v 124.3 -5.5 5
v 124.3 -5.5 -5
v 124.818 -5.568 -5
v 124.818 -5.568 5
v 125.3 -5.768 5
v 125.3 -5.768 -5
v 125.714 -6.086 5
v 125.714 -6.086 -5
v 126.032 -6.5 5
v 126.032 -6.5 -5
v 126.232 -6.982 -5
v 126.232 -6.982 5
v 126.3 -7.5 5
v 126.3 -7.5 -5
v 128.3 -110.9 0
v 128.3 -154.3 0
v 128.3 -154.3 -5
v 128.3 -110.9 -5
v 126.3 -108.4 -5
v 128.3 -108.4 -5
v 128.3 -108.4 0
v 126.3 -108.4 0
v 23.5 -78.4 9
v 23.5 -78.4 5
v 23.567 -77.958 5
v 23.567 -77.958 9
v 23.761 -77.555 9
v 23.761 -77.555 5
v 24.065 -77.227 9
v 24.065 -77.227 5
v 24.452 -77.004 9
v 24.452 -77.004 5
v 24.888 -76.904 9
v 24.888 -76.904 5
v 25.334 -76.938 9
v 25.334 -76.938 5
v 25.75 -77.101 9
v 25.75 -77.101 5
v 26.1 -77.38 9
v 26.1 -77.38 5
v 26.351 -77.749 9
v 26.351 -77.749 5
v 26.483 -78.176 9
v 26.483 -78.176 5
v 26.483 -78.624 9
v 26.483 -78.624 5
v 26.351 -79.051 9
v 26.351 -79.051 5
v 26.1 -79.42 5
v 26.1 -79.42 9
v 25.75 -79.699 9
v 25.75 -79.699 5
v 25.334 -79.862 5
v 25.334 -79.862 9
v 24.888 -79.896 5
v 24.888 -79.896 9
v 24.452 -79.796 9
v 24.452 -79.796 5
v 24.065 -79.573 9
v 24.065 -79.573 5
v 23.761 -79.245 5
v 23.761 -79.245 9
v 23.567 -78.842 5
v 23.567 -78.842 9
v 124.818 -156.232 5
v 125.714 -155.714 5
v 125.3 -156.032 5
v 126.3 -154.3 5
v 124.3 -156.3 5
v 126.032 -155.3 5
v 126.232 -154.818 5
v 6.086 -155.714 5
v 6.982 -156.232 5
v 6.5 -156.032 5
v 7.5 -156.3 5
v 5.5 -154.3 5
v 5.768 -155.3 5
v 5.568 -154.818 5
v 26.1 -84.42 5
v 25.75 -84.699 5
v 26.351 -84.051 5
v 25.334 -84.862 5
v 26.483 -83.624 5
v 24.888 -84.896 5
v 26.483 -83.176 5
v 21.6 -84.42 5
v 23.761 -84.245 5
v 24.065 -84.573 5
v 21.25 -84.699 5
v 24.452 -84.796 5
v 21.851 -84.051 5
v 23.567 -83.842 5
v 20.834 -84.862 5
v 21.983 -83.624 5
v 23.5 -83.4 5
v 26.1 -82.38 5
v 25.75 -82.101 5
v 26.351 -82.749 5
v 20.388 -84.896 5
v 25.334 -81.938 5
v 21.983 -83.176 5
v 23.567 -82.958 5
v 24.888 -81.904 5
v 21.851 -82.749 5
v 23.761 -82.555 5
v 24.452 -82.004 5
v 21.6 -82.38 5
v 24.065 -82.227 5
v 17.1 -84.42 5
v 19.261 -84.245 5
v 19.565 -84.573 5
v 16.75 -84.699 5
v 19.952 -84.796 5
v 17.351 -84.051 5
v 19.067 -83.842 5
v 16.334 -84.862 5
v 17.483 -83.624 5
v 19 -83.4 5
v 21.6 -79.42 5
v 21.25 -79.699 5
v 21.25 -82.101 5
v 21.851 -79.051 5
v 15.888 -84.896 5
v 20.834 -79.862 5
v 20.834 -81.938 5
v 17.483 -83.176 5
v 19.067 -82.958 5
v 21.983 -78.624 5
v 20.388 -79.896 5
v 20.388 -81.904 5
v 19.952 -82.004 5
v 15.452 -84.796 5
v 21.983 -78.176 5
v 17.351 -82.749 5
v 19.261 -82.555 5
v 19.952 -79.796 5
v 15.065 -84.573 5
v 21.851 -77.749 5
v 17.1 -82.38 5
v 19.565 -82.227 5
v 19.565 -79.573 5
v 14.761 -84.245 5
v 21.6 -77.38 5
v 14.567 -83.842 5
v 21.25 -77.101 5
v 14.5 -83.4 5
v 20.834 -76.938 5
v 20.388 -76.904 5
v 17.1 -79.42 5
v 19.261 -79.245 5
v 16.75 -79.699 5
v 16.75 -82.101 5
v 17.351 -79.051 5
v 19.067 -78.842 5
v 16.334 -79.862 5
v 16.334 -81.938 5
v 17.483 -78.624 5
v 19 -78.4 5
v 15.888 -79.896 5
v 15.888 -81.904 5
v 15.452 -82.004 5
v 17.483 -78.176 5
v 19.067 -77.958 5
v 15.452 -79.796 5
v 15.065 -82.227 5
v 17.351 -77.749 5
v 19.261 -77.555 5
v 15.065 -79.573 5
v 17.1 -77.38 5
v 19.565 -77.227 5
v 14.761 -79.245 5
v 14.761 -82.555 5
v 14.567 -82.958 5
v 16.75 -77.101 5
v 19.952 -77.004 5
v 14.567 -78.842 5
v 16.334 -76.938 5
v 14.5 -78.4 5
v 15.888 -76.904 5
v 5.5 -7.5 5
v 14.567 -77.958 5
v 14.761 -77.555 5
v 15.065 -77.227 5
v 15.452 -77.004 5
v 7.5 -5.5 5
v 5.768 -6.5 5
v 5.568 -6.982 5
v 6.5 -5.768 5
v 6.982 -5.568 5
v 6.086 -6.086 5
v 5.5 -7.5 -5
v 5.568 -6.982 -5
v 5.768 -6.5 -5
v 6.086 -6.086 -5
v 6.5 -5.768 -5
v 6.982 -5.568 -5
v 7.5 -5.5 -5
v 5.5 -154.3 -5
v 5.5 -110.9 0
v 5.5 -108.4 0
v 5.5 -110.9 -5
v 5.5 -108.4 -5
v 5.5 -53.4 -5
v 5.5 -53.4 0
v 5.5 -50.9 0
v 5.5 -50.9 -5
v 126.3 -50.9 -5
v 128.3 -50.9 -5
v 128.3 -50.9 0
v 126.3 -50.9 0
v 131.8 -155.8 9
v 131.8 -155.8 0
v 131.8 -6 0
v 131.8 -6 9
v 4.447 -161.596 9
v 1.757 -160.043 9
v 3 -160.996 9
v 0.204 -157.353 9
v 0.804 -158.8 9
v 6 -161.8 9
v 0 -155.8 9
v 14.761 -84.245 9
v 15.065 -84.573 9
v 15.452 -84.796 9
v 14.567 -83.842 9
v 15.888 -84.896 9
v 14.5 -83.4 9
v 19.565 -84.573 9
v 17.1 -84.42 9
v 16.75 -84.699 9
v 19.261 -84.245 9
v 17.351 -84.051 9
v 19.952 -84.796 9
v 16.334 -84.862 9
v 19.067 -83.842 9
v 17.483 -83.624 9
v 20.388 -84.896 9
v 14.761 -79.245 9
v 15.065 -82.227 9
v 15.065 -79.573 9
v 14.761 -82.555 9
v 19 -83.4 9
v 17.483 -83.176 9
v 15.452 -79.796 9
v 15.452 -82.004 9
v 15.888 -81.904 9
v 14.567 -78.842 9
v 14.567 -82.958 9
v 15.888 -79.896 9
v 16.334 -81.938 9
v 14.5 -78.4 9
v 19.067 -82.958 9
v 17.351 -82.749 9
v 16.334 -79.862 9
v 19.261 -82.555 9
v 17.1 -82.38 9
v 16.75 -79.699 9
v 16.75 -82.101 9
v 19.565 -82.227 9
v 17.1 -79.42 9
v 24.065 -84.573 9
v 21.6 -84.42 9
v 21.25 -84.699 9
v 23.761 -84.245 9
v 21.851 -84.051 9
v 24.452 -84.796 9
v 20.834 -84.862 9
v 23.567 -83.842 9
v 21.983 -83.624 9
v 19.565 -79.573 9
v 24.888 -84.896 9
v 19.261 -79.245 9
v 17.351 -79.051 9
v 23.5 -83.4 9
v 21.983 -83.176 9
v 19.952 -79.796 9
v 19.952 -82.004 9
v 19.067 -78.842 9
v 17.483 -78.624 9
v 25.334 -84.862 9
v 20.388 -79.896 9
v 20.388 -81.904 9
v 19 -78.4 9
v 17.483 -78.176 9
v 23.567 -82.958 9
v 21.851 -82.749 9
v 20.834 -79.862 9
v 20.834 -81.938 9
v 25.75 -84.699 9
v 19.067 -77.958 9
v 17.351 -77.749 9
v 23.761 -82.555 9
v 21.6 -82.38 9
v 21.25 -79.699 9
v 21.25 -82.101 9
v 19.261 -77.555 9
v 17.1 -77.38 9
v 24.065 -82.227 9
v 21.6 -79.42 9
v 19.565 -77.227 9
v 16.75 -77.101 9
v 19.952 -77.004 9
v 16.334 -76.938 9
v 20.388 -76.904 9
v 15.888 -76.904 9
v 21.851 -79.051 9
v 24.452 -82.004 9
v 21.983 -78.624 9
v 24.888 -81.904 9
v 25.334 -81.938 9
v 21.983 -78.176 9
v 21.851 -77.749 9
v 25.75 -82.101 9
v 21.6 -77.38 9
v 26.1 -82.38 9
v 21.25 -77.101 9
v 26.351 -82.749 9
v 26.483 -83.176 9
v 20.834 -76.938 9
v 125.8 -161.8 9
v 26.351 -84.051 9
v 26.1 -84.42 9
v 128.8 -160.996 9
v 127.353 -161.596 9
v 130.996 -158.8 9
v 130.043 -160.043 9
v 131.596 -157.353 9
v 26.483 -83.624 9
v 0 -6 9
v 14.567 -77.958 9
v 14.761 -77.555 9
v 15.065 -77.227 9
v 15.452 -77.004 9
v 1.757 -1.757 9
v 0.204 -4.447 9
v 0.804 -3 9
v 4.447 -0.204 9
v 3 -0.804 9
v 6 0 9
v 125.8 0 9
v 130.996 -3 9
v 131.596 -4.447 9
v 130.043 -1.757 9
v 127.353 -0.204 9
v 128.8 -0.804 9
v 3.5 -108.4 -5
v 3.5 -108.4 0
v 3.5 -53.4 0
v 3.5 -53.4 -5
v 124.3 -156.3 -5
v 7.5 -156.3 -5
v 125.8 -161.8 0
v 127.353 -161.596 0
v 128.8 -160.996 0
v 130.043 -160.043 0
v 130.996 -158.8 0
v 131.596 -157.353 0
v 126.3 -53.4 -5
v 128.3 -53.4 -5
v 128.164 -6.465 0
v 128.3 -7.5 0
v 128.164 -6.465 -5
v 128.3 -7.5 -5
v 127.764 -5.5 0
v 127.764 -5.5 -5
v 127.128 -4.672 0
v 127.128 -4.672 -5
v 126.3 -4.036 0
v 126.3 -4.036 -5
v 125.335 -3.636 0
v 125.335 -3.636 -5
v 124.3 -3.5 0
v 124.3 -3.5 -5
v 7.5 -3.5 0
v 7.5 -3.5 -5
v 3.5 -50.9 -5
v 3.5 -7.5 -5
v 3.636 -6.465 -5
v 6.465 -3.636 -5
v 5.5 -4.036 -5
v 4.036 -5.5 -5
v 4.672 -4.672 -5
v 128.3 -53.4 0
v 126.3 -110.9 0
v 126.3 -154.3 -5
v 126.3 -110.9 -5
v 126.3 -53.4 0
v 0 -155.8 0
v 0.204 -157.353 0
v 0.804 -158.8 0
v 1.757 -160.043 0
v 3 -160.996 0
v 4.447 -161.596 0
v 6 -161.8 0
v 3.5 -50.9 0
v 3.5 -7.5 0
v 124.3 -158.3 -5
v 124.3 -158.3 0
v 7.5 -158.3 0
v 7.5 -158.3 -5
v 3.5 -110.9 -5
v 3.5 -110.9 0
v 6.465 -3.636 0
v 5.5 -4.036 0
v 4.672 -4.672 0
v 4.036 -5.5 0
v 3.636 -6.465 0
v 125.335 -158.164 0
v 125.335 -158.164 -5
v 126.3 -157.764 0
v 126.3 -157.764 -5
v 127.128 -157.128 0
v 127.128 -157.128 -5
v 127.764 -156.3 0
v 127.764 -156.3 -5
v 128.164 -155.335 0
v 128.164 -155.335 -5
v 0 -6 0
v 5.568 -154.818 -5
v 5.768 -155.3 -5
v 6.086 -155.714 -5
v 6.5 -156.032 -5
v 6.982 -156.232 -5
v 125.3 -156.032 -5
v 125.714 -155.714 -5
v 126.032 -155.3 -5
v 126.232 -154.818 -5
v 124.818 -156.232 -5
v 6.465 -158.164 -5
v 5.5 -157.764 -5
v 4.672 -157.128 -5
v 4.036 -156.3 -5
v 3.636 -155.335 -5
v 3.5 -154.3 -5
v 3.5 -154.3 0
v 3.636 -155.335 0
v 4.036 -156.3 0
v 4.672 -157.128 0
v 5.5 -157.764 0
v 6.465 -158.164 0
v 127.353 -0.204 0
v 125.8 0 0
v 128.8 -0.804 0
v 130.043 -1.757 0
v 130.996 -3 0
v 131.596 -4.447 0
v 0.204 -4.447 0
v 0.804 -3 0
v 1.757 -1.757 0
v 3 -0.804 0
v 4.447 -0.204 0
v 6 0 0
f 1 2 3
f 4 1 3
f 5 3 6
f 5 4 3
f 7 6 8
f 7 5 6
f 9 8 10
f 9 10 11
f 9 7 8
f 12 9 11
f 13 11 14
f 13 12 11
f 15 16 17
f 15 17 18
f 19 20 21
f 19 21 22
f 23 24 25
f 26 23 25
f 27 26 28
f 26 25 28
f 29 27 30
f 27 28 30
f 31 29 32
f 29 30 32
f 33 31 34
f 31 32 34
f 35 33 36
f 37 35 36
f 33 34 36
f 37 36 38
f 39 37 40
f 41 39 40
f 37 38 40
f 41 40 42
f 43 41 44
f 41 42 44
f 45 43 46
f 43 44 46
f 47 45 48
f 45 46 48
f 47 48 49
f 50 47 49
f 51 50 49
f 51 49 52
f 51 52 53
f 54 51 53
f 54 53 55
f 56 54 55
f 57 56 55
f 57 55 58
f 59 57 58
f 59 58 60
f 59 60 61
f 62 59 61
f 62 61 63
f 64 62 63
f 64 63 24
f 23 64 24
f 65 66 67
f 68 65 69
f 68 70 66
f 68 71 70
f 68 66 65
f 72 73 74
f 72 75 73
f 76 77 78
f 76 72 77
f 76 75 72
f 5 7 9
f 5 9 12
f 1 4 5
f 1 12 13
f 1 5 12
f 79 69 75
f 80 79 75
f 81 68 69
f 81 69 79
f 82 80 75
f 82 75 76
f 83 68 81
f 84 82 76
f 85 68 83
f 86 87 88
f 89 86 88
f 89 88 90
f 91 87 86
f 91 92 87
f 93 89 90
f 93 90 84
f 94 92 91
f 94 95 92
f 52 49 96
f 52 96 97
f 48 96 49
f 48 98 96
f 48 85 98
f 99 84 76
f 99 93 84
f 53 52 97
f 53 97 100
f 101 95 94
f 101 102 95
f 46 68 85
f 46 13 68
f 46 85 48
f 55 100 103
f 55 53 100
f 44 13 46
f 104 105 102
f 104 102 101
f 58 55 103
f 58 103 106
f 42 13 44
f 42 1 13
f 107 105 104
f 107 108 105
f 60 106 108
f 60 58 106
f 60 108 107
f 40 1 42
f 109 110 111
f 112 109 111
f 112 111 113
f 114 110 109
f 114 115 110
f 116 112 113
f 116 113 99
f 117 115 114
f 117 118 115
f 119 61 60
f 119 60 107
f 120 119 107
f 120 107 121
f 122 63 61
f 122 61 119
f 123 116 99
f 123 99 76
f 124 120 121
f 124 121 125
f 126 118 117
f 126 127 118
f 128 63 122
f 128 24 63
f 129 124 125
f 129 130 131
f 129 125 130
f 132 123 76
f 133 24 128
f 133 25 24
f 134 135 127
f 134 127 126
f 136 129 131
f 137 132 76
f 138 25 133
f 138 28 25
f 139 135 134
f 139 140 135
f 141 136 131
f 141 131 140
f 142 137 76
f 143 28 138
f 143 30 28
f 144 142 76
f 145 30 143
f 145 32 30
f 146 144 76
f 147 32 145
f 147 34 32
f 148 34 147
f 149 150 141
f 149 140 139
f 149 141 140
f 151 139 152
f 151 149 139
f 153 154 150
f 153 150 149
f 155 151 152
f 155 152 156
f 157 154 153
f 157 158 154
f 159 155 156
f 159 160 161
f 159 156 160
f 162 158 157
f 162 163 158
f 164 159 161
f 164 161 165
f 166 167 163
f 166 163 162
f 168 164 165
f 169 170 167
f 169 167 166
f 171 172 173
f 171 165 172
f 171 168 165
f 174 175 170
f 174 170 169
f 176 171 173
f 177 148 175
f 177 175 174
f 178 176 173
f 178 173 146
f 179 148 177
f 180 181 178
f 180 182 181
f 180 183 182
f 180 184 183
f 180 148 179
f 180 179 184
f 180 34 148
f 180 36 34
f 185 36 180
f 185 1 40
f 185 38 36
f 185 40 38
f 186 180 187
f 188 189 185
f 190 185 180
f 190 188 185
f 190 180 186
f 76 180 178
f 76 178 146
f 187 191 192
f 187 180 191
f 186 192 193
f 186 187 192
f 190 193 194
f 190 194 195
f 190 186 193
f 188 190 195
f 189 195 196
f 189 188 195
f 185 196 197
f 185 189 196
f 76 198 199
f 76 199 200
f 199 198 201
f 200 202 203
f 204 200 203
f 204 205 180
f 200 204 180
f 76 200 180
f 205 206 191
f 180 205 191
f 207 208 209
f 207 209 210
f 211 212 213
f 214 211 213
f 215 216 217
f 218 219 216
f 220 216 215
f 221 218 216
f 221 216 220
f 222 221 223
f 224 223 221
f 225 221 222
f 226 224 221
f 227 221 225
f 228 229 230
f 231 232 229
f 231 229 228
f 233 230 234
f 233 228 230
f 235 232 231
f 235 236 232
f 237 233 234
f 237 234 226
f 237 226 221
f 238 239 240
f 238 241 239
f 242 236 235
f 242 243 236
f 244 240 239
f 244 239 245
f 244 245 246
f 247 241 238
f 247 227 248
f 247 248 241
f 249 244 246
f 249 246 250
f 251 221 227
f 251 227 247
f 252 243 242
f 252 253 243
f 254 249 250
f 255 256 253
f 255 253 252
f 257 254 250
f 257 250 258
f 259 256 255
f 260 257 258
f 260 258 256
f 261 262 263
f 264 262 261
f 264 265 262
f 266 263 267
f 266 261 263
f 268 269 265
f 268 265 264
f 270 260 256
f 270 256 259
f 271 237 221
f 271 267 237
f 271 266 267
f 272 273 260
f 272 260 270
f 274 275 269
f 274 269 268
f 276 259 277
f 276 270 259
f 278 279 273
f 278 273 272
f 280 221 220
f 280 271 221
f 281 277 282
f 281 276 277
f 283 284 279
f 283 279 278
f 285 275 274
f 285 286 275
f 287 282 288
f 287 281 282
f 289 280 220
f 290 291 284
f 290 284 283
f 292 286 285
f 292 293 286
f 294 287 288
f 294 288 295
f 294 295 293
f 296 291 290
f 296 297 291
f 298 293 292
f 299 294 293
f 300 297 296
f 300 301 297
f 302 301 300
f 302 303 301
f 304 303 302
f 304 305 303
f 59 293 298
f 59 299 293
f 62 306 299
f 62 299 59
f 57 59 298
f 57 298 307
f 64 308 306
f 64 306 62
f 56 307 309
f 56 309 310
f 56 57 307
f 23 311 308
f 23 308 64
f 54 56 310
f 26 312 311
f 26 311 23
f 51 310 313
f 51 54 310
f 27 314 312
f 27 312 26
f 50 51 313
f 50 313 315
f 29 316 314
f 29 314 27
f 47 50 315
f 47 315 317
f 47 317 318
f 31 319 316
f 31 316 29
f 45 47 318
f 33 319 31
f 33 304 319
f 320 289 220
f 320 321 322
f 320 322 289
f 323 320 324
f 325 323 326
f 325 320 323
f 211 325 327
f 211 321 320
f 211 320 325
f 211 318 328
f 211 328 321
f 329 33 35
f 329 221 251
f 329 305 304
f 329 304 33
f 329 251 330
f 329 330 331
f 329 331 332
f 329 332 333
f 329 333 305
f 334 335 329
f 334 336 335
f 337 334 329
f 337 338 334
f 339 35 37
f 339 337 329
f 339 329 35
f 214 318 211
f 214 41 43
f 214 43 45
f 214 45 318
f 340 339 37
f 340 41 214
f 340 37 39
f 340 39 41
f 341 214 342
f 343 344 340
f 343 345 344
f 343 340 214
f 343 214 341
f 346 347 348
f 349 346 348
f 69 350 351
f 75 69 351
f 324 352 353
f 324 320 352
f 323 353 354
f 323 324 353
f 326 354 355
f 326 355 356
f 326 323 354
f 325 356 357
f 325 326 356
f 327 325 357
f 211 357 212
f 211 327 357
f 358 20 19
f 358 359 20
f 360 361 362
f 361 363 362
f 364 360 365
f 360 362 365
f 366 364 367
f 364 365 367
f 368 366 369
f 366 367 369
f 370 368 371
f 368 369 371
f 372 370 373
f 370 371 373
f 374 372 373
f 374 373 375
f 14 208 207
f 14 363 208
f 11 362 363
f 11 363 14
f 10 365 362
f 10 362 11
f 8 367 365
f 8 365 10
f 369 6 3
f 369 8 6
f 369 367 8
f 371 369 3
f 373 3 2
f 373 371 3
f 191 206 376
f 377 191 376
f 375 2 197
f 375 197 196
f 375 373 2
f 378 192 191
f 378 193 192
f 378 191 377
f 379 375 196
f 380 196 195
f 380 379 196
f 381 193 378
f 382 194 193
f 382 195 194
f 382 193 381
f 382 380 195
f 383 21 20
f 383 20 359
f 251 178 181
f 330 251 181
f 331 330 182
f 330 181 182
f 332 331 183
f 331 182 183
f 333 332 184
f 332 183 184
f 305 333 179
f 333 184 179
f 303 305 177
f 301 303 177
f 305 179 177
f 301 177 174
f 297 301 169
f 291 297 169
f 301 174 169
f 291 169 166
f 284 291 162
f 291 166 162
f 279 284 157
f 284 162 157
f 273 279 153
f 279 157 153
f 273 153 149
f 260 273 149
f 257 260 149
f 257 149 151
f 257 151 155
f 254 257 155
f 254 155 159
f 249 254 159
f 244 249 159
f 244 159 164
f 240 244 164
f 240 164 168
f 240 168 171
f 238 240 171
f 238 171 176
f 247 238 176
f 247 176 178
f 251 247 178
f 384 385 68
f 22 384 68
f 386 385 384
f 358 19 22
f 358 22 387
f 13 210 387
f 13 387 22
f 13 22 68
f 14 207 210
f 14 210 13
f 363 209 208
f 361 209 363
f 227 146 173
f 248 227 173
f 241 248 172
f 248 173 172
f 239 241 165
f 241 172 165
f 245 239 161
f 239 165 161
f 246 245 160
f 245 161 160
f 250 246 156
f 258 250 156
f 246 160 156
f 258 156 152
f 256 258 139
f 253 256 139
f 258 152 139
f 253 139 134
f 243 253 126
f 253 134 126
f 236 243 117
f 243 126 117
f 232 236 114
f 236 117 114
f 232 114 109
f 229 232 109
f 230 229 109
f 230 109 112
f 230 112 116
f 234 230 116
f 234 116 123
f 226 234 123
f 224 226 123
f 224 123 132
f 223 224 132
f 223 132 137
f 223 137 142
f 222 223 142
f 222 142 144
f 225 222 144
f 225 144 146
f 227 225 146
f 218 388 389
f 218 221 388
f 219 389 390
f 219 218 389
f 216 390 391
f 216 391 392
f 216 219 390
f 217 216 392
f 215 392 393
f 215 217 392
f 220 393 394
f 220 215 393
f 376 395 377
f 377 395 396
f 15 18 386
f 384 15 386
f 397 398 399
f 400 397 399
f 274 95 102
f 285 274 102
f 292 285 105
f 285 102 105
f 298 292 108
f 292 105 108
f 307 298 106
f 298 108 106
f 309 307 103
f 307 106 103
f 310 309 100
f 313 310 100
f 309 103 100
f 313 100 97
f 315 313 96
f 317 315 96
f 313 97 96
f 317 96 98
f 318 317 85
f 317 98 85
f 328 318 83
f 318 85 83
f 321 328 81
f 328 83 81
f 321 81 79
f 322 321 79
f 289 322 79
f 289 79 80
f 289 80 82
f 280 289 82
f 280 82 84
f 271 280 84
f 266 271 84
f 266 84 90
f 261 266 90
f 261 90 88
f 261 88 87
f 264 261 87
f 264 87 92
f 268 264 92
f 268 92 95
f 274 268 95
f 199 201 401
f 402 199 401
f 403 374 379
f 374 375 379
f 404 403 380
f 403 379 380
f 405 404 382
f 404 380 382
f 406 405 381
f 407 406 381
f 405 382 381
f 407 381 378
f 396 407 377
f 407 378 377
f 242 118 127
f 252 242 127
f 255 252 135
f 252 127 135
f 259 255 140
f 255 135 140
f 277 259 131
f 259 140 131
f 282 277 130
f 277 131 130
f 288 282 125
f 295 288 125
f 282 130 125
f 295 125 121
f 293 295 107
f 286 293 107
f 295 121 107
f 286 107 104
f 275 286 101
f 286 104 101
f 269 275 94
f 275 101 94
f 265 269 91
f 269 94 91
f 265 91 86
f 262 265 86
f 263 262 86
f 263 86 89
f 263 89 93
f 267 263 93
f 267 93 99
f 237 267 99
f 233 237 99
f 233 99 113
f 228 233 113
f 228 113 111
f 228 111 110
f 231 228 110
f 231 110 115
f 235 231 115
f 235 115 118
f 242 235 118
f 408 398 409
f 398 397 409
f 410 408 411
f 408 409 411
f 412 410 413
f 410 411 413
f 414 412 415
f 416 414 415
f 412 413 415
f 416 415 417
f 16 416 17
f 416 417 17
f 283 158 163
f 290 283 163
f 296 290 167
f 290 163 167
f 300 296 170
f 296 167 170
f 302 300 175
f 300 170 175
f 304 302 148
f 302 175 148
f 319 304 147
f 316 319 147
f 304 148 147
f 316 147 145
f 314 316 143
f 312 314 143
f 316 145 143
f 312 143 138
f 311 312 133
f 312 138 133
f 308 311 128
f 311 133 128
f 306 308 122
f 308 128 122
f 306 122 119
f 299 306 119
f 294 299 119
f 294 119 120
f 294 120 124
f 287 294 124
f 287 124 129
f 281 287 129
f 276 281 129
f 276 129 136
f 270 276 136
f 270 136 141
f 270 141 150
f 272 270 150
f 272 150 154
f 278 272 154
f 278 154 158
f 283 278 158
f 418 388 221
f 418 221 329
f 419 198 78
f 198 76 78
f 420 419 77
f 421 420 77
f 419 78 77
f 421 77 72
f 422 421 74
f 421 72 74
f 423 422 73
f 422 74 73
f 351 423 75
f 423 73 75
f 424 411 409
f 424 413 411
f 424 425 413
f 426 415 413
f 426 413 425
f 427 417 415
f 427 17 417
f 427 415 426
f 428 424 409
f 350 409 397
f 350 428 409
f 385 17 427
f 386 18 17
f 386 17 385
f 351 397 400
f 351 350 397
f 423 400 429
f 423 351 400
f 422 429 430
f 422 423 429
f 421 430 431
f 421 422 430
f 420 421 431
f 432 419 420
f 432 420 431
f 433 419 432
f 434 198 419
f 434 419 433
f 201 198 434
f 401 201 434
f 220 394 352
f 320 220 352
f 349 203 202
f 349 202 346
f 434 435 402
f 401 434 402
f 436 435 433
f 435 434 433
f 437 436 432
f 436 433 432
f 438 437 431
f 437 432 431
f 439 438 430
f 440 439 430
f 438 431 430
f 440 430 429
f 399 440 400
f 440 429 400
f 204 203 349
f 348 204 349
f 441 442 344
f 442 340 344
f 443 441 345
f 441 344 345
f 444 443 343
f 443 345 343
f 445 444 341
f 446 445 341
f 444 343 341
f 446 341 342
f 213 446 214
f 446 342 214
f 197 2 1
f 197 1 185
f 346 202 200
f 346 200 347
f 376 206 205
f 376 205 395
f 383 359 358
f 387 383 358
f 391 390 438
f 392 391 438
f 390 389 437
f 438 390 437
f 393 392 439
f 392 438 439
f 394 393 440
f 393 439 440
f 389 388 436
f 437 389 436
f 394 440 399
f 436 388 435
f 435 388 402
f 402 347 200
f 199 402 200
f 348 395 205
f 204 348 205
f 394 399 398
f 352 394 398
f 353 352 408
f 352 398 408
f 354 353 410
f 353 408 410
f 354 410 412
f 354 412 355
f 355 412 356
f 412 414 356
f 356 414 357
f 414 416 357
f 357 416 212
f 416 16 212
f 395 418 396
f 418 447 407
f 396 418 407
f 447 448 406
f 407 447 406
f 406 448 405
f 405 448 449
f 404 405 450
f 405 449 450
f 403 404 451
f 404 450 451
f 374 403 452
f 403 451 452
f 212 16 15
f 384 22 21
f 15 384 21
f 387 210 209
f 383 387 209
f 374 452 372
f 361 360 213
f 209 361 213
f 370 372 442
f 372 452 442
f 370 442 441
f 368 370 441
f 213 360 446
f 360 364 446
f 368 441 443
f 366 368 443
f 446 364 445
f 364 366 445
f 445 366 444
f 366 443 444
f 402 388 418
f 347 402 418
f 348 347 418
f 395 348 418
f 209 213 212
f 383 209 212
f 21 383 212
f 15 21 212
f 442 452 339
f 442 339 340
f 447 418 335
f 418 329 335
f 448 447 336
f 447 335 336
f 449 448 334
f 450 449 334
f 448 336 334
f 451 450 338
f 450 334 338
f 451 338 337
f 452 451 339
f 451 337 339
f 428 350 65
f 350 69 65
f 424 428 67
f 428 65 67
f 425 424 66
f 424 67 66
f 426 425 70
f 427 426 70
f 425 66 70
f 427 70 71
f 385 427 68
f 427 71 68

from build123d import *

# Parameters (mm, degrees)
CROQUIS1_W              = 131.8
CROQUIS1_H              = 161.8
SALIENTE_EXTRUIR1_DEPTH = 9
CROQUIS2_W              = 124.8
CROQUIS2_H              = 154.8
SALIENTE_EXTRUIR2_DEPTH = 5
CROQUIS4_W              = 120.8
CROQUIS4_H              = 150.8
CORTAR_EXTRUIR1_DEPTH   = 10
REDONDEO1_R             = 4
REDONDEO2_R             = 2
REDONDEO3_R             = 4
REDONDEO4_R             = 4
REDONDEO5_R             = 2
REDONDEO6_R             = 4
REDONDEO7_R             = 2
REDONDEO8_R             = 6
CROQUIS9_W              = 124.8
CROQUIS9_H              = 2.5
CORTAR_EXTRUIR3_DEPTH   = 5
CROQUIS11_R             = 1.5
CORTAR_EXTRUIR6_DEPTH   = 9


with BuildPart() as part:
    # Croquis1 → Saliente-Extruir1 (new body)
    with BuildSketch(Plane.XY):
        with Locations((65.9, -80.9)):
            Rectangle(CROQUIS1_W, CROQUIS1_H)
    extrude(amount=SALIENTE_EXTRUIR1_DEPTH)

    # Croquis2 → Saliente-Extruir2 (add)
    with BuildSketch(Plane(origin=(0, 0, 0), x_dir=(-1, 0, 0), z_dir=(0, 0, -1))):
        with Locations((-65.9, -80.9)):
            Rectangle(CROQUIS2_W, CROQUIS2_H)
    extrude(amount=SALIENTE_EXTRUIR2_DEPTH)

    # Croquis4 → Cortar-Extruir1 (cut)
    with BuildSketch(Plane(origin=(0, 0, -5), x_dir=(-1, 0, 0), z_dir=(0, 0, -1))):
        with Locations((-65.9, -80.9)):
            Rectangle(CROQUIS4_W, CROQUIS4_H)
    extrude(amount=-CORTAR_EXTRUIR1_DEPTH, mode=Mode.SUBTRACT)

    # Redondeo1
    redondeo1_edges = [part.edges().sort_by_distance(p)[0] for p in [
        (128.3, -3.5, -2.5),
    ]]
    fillet(redondeo1_edges, radius=REDONDEO1_R)

    # Redondeo2
    redondeo2_edges = [part.edges().sort_by_distance(p)[0] for p in [
        (5.5, -5.5, 0),
    ]]
    fillet(redondeo2_edges, radius=REDONDEO2_R)

    # Redondeo3
    redondeo3_edges = [part.edges().sort_by_distance(p)[0] for p in [
        (3.5, -3.5, -2.5),
    ]]
    fillet(redondeo3_edges, radius=REDONDEO3_R)

    # Redondeo4
    redondeo4_edges = [part.edges().sort_by_distance(p)[0] for p in [
        (3.5, -158.3, -2.5),
    ]]
    fillet(redondeo4_edges, radius=REDONDEO4_R)

    # Redondeo5
    redondeo5_edges = [part.edges().sort_by_distance(p)[0] for p in [
        (5.5, -156.3, 0),
    ]]
    fillet(redondeo5_edges, radius=REDONDEO5_R)

    # Redondeo6
    redondeo6_edges = [part.edges().sort_by_distance(p)[0] for p in [
        (128.3, -158.3, -2.5),
    ]]
    fillet(redondeo6_edges, radius=REDONDEO6_R)

    # Redondeo7
    redondeo7_edges = [part.edges().sort_by_distance(p)[0] for p in [
        (126.3, -156.3, 0),
        (126.3, -5.5, 0),
    ]]
    fillet(redondeo7_edges, radius=REDONDEO7_R)

    # Redondeo8
    redondeo8_edges = [part.edges().sort_by_distance(p)[0] for p in [
        (0, 0, 4.5),
        (131.8, 0, 4.5),
        (131.8, -161.8, 4.5),
        (0, -161.8, 4.5),
    ]]
    fillet(redondeo8_edges, radius=REDONDEO8_R)

    # Croquis9 → Cortar-Extruir3 (cut)
    with BuildSketch(Plane(origin=(0, 0, -5), x_dir=(-1, 0, 0), z_dir=(0, 0, -1))):
        with Locations((-65.9, -52.15)):
            Rectangle(CROQUIS9_W, CROQUIS9_H)
        with Locations((-65.9, -109.65)):
            Rectangle(CROQUIS9_W, CROQUIS9_H)
    extrude(amount=-CORTAR_EXTRUIR3_DEPTH, mode=Mode.SUBTRACT)

    # Croquis11 → Cortar-Extruir6 (cut)
    with BuildSketch(Plane(origin=(0, 0, 5), x_dir=(-1, 0, 0), z_dir=(0, 0, -1))):
        with Locations((-25, -78.4)):
            Circle(CROQUIS11_R)
        with Locations((-25, -83.4)):
            Circle(CROQUIS11_R)
        with Locations((-20.5, -83.4)):
            Circle(CROQUIS11_R)
        with Locations((-16, -83.4)):
            Circle(CROQUIS11_R)
        with Locations((-20.5, -78.4)):
            Circle(CROQUIS11_R)
        with Locations((-16, -78.4)):
            Circle(CROQUIS11_R)
    extrude(amount=-CORTAR_EXTRUIR6_DEPTH, mode=Mode.SUBTRACT)


solid = part.part
